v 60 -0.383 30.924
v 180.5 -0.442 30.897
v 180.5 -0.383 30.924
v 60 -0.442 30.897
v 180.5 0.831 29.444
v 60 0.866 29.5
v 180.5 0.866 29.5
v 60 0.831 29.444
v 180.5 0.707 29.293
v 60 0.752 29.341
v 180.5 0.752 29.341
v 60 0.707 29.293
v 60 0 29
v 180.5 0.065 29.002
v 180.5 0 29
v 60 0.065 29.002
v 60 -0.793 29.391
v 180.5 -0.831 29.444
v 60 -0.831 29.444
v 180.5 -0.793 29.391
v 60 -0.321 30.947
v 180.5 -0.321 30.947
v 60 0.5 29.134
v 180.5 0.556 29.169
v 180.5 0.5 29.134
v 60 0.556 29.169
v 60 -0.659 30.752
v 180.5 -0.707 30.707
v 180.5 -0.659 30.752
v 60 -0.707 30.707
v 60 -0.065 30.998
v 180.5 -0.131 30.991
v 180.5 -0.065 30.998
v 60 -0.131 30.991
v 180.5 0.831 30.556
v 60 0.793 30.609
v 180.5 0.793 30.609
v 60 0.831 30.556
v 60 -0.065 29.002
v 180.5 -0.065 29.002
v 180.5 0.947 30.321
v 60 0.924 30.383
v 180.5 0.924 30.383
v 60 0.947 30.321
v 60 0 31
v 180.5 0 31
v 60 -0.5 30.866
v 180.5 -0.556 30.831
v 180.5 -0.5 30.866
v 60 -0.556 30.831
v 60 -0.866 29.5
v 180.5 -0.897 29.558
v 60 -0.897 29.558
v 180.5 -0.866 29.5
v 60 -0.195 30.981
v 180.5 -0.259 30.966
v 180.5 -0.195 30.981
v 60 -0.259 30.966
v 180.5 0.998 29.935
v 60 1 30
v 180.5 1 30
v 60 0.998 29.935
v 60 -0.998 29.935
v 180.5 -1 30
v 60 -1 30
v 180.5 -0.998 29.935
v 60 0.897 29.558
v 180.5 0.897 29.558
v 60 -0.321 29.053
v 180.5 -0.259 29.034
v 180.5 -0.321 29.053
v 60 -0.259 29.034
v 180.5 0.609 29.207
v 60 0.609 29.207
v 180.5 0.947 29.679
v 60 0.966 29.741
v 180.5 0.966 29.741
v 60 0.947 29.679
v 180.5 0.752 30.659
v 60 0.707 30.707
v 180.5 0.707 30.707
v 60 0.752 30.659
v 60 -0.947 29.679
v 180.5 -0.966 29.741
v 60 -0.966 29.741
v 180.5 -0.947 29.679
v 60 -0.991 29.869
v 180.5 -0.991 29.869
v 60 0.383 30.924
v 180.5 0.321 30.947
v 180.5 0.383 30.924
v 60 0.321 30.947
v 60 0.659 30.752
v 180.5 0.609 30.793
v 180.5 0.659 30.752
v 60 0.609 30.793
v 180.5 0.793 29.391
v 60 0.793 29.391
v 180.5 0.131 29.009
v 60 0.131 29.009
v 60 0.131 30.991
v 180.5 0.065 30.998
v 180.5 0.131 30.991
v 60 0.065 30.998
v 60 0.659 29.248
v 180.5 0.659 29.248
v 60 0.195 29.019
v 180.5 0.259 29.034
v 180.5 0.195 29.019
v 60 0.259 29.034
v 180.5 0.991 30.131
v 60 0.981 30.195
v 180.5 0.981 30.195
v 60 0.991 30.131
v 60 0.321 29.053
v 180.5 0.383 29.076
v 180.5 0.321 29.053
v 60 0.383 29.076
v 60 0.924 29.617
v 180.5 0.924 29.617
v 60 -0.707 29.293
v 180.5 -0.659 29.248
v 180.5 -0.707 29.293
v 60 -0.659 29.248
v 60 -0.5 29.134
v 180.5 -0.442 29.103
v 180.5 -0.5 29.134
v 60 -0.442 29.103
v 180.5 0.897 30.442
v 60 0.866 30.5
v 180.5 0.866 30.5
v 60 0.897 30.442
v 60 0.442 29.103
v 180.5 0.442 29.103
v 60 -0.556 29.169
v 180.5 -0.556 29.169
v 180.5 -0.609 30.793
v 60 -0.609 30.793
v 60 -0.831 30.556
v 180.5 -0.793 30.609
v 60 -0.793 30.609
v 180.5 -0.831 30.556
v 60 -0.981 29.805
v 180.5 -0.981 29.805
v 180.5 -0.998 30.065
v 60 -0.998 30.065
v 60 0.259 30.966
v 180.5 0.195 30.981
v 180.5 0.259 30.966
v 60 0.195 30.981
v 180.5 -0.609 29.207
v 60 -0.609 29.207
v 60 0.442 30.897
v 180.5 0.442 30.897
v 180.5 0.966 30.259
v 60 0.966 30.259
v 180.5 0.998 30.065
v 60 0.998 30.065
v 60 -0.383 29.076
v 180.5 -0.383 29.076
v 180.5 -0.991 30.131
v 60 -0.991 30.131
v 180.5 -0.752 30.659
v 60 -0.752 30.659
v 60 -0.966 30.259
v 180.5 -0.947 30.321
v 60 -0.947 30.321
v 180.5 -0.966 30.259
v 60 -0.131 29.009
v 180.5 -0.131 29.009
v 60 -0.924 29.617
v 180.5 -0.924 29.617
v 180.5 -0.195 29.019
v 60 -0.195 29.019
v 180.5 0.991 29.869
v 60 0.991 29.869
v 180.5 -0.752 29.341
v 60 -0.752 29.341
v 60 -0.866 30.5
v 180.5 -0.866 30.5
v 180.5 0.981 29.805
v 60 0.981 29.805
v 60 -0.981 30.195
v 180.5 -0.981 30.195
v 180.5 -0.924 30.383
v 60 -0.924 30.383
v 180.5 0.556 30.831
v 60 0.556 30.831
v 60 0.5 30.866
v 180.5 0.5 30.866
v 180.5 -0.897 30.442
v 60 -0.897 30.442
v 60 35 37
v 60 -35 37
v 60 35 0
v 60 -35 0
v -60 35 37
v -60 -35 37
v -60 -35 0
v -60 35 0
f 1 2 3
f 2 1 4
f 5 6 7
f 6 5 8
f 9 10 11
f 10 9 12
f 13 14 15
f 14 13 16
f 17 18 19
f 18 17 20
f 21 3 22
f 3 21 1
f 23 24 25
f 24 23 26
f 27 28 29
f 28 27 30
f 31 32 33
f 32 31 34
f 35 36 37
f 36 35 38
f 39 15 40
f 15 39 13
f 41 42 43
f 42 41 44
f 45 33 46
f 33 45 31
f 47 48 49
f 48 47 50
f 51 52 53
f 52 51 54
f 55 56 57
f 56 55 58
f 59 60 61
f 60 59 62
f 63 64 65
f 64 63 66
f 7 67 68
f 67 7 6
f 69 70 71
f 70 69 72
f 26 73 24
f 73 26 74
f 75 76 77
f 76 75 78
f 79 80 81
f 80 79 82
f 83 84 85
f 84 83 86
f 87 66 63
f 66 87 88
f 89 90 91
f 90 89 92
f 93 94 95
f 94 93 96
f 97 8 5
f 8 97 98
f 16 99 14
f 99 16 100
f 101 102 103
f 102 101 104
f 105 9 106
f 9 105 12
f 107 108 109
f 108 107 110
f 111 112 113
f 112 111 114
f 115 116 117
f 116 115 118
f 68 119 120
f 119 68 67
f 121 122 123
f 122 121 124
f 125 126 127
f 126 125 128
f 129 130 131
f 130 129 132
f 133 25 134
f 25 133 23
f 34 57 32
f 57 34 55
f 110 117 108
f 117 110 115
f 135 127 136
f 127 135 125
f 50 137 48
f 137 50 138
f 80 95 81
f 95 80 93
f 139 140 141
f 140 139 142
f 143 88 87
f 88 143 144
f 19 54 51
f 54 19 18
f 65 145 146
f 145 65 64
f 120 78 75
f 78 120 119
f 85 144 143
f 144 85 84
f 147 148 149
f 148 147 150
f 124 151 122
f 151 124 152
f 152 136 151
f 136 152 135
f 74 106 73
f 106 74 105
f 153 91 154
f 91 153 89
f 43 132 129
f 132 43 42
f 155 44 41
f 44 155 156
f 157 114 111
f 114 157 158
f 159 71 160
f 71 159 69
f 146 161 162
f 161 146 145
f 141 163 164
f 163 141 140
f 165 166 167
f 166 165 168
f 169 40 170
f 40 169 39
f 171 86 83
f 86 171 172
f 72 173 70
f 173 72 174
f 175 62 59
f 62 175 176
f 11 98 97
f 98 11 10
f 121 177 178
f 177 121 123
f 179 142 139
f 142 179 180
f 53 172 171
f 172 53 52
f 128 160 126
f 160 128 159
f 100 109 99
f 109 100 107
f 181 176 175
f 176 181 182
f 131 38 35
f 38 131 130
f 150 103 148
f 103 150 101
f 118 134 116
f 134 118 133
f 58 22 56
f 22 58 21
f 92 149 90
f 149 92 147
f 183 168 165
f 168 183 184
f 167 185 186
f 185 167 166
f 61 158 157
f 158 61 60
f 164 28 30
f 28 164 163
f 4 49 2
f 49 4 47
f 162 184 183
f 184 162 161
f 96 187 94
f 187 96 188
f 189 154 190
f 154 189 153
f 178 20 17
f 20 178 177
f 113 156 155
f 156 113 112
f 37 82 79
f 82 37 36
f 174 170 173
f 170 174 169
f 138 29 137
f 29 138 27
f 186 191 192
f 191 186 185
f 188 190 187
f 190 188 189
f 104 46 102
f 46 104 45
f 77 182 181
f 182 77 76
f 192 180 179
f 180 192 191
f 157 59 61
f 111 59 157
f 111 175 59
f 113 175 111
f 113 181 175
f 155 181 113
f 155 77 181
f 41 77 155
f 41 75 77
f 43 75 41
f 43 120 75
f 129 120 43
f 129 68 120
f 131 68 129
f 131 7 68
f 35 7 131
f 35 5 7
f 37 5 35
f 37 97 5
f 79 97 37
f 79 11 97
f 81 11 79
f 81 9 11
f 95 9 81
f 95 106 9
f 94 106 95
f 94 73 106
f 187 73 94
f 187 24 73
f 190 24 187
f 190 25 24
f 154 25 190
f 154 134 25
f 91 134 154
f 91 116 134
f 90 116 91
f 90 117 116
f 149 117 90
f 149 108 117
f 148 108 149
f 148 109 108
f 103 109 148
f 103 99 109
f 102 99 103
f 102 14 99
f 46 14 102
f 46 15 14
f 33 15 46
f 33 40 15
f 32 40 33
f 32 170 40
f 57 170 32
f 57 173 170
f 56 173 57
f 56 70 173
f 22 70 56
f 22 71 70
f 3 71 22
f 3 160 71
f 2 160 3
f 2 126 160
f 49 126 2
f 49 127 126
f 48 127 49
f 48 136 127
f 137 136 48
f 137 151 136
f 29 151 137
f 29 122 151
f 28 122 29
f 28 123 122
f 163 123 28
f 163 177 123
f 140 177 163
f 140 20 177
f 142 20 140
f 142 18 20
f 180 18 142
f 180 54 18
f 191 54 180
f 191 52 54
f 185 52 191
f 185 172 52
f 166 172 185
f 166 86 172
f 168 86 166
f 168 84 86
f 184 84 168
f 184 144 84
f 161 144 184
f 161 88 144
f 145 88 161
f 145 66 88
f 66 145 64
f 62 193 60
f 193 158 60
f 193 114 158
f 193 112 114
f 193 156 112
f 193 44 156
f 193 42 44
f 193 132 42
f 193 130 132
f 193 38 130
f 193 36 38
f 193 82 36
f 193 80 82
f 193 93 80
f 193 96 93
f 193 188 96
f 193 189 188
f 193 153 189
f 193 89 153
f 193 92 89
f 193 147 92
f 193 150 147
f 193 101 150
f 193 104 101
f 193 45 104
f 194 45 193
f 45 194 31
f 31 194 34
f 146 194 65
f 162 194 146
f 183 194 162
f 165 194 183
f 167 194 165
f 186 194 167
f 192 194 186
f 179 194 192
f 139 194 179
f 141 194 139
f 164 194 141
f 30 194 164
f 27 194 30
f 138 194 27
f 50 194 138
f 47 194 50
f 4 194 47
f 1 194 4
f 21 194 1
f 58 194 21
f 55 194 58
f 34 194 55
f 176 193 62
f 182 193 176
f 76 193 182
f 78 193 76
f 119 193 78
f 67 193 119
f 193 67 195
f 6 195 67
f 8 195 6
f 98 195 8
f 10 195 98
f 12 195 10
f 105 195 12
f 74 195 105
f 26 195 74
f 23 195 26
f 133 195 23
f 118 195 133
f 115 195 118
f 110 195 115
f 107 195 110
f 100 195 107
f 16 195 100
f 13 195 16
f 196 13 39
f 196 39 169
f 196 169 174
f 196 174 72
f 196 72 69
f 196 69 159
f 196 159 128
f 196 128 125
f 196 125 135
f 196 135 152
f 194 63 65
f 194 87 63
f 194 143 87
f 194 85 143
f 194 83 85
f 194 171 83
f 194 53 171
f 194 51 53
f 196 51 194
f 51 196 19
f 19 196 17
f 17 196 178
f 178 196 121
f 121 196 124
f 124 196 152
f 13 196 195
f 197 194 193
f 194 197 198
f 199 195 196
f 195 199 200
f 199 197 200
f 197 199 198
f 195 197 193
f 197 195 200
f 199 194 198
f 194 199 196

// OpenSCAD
// Mini horizontal gel-electrophoresis box - buffer tank
// Print orientation: tank rests on XY plane (z = 0), builds upward (+Z)

// ---------------- Parameters ----------------
outer_x   = 120;   // outer length in X (mm)
outer_y   = 70;    // outer width in Y (mm)
outer_z   = 40;    // outer height in Z (mm)

wall      = 3;     // wall thickness (mm)
floor     = 3;     // floor thickness (mm)

platform_x = 60;   // platform length in X (mm), centred
platform_top_z = 13; // height of platform top above inner floor (mm)

hole_d    = 2;     // electrode hole diameter (mm)
hole_y    = 0;     // hole centre Y position (mm)
hole_z    = 30;    // hole centre Z position (mm)

eps       = 0.5;   // cutter overshoot past faces (mm)
$fn       = 96;    // curve resolution

// ---------------- Derived ----------------
inner_x = outer_x - 2*wall;   // 114 mm
inner_y = outer_y - 2*wall;   // 64 mm
inner_floor_z = floor;        // 3 mm (inner floor lies on z = floor)

platform_bottom_z = inner_floor_z + wall + floor + (platform_top_z - floor);
// = 3 + 3 + 3 + 7 = 16 mm (platform spans walls and floor, top at z = 13 + floor = 16)

// ---------------- Model ----------------
union() {
    // Main tank body (open top)
    translate([-outer_x/2, -outer_y/2, 0])
        cube([outer_x, outer_y, outer_z - floor]);

    // Raised gel-tray platform, centred in X, spanning full Y
    translate([-outer_x/2, -outer_y/2, platform_bottom_z])
        cube([outer_x, outer_y, platform_top_z - floor]);

    // Electrode holes through each end wall, along X
    for (sx = [-1, 1])
        translate([sx > 0 ? outer_x/2 - eps : -outer_x/2 + eps, hole_y, hole_z])
            rotate([0, 90, 0])
                cylinder(d = hole_d, h = outer_x + 2*eps);
}
